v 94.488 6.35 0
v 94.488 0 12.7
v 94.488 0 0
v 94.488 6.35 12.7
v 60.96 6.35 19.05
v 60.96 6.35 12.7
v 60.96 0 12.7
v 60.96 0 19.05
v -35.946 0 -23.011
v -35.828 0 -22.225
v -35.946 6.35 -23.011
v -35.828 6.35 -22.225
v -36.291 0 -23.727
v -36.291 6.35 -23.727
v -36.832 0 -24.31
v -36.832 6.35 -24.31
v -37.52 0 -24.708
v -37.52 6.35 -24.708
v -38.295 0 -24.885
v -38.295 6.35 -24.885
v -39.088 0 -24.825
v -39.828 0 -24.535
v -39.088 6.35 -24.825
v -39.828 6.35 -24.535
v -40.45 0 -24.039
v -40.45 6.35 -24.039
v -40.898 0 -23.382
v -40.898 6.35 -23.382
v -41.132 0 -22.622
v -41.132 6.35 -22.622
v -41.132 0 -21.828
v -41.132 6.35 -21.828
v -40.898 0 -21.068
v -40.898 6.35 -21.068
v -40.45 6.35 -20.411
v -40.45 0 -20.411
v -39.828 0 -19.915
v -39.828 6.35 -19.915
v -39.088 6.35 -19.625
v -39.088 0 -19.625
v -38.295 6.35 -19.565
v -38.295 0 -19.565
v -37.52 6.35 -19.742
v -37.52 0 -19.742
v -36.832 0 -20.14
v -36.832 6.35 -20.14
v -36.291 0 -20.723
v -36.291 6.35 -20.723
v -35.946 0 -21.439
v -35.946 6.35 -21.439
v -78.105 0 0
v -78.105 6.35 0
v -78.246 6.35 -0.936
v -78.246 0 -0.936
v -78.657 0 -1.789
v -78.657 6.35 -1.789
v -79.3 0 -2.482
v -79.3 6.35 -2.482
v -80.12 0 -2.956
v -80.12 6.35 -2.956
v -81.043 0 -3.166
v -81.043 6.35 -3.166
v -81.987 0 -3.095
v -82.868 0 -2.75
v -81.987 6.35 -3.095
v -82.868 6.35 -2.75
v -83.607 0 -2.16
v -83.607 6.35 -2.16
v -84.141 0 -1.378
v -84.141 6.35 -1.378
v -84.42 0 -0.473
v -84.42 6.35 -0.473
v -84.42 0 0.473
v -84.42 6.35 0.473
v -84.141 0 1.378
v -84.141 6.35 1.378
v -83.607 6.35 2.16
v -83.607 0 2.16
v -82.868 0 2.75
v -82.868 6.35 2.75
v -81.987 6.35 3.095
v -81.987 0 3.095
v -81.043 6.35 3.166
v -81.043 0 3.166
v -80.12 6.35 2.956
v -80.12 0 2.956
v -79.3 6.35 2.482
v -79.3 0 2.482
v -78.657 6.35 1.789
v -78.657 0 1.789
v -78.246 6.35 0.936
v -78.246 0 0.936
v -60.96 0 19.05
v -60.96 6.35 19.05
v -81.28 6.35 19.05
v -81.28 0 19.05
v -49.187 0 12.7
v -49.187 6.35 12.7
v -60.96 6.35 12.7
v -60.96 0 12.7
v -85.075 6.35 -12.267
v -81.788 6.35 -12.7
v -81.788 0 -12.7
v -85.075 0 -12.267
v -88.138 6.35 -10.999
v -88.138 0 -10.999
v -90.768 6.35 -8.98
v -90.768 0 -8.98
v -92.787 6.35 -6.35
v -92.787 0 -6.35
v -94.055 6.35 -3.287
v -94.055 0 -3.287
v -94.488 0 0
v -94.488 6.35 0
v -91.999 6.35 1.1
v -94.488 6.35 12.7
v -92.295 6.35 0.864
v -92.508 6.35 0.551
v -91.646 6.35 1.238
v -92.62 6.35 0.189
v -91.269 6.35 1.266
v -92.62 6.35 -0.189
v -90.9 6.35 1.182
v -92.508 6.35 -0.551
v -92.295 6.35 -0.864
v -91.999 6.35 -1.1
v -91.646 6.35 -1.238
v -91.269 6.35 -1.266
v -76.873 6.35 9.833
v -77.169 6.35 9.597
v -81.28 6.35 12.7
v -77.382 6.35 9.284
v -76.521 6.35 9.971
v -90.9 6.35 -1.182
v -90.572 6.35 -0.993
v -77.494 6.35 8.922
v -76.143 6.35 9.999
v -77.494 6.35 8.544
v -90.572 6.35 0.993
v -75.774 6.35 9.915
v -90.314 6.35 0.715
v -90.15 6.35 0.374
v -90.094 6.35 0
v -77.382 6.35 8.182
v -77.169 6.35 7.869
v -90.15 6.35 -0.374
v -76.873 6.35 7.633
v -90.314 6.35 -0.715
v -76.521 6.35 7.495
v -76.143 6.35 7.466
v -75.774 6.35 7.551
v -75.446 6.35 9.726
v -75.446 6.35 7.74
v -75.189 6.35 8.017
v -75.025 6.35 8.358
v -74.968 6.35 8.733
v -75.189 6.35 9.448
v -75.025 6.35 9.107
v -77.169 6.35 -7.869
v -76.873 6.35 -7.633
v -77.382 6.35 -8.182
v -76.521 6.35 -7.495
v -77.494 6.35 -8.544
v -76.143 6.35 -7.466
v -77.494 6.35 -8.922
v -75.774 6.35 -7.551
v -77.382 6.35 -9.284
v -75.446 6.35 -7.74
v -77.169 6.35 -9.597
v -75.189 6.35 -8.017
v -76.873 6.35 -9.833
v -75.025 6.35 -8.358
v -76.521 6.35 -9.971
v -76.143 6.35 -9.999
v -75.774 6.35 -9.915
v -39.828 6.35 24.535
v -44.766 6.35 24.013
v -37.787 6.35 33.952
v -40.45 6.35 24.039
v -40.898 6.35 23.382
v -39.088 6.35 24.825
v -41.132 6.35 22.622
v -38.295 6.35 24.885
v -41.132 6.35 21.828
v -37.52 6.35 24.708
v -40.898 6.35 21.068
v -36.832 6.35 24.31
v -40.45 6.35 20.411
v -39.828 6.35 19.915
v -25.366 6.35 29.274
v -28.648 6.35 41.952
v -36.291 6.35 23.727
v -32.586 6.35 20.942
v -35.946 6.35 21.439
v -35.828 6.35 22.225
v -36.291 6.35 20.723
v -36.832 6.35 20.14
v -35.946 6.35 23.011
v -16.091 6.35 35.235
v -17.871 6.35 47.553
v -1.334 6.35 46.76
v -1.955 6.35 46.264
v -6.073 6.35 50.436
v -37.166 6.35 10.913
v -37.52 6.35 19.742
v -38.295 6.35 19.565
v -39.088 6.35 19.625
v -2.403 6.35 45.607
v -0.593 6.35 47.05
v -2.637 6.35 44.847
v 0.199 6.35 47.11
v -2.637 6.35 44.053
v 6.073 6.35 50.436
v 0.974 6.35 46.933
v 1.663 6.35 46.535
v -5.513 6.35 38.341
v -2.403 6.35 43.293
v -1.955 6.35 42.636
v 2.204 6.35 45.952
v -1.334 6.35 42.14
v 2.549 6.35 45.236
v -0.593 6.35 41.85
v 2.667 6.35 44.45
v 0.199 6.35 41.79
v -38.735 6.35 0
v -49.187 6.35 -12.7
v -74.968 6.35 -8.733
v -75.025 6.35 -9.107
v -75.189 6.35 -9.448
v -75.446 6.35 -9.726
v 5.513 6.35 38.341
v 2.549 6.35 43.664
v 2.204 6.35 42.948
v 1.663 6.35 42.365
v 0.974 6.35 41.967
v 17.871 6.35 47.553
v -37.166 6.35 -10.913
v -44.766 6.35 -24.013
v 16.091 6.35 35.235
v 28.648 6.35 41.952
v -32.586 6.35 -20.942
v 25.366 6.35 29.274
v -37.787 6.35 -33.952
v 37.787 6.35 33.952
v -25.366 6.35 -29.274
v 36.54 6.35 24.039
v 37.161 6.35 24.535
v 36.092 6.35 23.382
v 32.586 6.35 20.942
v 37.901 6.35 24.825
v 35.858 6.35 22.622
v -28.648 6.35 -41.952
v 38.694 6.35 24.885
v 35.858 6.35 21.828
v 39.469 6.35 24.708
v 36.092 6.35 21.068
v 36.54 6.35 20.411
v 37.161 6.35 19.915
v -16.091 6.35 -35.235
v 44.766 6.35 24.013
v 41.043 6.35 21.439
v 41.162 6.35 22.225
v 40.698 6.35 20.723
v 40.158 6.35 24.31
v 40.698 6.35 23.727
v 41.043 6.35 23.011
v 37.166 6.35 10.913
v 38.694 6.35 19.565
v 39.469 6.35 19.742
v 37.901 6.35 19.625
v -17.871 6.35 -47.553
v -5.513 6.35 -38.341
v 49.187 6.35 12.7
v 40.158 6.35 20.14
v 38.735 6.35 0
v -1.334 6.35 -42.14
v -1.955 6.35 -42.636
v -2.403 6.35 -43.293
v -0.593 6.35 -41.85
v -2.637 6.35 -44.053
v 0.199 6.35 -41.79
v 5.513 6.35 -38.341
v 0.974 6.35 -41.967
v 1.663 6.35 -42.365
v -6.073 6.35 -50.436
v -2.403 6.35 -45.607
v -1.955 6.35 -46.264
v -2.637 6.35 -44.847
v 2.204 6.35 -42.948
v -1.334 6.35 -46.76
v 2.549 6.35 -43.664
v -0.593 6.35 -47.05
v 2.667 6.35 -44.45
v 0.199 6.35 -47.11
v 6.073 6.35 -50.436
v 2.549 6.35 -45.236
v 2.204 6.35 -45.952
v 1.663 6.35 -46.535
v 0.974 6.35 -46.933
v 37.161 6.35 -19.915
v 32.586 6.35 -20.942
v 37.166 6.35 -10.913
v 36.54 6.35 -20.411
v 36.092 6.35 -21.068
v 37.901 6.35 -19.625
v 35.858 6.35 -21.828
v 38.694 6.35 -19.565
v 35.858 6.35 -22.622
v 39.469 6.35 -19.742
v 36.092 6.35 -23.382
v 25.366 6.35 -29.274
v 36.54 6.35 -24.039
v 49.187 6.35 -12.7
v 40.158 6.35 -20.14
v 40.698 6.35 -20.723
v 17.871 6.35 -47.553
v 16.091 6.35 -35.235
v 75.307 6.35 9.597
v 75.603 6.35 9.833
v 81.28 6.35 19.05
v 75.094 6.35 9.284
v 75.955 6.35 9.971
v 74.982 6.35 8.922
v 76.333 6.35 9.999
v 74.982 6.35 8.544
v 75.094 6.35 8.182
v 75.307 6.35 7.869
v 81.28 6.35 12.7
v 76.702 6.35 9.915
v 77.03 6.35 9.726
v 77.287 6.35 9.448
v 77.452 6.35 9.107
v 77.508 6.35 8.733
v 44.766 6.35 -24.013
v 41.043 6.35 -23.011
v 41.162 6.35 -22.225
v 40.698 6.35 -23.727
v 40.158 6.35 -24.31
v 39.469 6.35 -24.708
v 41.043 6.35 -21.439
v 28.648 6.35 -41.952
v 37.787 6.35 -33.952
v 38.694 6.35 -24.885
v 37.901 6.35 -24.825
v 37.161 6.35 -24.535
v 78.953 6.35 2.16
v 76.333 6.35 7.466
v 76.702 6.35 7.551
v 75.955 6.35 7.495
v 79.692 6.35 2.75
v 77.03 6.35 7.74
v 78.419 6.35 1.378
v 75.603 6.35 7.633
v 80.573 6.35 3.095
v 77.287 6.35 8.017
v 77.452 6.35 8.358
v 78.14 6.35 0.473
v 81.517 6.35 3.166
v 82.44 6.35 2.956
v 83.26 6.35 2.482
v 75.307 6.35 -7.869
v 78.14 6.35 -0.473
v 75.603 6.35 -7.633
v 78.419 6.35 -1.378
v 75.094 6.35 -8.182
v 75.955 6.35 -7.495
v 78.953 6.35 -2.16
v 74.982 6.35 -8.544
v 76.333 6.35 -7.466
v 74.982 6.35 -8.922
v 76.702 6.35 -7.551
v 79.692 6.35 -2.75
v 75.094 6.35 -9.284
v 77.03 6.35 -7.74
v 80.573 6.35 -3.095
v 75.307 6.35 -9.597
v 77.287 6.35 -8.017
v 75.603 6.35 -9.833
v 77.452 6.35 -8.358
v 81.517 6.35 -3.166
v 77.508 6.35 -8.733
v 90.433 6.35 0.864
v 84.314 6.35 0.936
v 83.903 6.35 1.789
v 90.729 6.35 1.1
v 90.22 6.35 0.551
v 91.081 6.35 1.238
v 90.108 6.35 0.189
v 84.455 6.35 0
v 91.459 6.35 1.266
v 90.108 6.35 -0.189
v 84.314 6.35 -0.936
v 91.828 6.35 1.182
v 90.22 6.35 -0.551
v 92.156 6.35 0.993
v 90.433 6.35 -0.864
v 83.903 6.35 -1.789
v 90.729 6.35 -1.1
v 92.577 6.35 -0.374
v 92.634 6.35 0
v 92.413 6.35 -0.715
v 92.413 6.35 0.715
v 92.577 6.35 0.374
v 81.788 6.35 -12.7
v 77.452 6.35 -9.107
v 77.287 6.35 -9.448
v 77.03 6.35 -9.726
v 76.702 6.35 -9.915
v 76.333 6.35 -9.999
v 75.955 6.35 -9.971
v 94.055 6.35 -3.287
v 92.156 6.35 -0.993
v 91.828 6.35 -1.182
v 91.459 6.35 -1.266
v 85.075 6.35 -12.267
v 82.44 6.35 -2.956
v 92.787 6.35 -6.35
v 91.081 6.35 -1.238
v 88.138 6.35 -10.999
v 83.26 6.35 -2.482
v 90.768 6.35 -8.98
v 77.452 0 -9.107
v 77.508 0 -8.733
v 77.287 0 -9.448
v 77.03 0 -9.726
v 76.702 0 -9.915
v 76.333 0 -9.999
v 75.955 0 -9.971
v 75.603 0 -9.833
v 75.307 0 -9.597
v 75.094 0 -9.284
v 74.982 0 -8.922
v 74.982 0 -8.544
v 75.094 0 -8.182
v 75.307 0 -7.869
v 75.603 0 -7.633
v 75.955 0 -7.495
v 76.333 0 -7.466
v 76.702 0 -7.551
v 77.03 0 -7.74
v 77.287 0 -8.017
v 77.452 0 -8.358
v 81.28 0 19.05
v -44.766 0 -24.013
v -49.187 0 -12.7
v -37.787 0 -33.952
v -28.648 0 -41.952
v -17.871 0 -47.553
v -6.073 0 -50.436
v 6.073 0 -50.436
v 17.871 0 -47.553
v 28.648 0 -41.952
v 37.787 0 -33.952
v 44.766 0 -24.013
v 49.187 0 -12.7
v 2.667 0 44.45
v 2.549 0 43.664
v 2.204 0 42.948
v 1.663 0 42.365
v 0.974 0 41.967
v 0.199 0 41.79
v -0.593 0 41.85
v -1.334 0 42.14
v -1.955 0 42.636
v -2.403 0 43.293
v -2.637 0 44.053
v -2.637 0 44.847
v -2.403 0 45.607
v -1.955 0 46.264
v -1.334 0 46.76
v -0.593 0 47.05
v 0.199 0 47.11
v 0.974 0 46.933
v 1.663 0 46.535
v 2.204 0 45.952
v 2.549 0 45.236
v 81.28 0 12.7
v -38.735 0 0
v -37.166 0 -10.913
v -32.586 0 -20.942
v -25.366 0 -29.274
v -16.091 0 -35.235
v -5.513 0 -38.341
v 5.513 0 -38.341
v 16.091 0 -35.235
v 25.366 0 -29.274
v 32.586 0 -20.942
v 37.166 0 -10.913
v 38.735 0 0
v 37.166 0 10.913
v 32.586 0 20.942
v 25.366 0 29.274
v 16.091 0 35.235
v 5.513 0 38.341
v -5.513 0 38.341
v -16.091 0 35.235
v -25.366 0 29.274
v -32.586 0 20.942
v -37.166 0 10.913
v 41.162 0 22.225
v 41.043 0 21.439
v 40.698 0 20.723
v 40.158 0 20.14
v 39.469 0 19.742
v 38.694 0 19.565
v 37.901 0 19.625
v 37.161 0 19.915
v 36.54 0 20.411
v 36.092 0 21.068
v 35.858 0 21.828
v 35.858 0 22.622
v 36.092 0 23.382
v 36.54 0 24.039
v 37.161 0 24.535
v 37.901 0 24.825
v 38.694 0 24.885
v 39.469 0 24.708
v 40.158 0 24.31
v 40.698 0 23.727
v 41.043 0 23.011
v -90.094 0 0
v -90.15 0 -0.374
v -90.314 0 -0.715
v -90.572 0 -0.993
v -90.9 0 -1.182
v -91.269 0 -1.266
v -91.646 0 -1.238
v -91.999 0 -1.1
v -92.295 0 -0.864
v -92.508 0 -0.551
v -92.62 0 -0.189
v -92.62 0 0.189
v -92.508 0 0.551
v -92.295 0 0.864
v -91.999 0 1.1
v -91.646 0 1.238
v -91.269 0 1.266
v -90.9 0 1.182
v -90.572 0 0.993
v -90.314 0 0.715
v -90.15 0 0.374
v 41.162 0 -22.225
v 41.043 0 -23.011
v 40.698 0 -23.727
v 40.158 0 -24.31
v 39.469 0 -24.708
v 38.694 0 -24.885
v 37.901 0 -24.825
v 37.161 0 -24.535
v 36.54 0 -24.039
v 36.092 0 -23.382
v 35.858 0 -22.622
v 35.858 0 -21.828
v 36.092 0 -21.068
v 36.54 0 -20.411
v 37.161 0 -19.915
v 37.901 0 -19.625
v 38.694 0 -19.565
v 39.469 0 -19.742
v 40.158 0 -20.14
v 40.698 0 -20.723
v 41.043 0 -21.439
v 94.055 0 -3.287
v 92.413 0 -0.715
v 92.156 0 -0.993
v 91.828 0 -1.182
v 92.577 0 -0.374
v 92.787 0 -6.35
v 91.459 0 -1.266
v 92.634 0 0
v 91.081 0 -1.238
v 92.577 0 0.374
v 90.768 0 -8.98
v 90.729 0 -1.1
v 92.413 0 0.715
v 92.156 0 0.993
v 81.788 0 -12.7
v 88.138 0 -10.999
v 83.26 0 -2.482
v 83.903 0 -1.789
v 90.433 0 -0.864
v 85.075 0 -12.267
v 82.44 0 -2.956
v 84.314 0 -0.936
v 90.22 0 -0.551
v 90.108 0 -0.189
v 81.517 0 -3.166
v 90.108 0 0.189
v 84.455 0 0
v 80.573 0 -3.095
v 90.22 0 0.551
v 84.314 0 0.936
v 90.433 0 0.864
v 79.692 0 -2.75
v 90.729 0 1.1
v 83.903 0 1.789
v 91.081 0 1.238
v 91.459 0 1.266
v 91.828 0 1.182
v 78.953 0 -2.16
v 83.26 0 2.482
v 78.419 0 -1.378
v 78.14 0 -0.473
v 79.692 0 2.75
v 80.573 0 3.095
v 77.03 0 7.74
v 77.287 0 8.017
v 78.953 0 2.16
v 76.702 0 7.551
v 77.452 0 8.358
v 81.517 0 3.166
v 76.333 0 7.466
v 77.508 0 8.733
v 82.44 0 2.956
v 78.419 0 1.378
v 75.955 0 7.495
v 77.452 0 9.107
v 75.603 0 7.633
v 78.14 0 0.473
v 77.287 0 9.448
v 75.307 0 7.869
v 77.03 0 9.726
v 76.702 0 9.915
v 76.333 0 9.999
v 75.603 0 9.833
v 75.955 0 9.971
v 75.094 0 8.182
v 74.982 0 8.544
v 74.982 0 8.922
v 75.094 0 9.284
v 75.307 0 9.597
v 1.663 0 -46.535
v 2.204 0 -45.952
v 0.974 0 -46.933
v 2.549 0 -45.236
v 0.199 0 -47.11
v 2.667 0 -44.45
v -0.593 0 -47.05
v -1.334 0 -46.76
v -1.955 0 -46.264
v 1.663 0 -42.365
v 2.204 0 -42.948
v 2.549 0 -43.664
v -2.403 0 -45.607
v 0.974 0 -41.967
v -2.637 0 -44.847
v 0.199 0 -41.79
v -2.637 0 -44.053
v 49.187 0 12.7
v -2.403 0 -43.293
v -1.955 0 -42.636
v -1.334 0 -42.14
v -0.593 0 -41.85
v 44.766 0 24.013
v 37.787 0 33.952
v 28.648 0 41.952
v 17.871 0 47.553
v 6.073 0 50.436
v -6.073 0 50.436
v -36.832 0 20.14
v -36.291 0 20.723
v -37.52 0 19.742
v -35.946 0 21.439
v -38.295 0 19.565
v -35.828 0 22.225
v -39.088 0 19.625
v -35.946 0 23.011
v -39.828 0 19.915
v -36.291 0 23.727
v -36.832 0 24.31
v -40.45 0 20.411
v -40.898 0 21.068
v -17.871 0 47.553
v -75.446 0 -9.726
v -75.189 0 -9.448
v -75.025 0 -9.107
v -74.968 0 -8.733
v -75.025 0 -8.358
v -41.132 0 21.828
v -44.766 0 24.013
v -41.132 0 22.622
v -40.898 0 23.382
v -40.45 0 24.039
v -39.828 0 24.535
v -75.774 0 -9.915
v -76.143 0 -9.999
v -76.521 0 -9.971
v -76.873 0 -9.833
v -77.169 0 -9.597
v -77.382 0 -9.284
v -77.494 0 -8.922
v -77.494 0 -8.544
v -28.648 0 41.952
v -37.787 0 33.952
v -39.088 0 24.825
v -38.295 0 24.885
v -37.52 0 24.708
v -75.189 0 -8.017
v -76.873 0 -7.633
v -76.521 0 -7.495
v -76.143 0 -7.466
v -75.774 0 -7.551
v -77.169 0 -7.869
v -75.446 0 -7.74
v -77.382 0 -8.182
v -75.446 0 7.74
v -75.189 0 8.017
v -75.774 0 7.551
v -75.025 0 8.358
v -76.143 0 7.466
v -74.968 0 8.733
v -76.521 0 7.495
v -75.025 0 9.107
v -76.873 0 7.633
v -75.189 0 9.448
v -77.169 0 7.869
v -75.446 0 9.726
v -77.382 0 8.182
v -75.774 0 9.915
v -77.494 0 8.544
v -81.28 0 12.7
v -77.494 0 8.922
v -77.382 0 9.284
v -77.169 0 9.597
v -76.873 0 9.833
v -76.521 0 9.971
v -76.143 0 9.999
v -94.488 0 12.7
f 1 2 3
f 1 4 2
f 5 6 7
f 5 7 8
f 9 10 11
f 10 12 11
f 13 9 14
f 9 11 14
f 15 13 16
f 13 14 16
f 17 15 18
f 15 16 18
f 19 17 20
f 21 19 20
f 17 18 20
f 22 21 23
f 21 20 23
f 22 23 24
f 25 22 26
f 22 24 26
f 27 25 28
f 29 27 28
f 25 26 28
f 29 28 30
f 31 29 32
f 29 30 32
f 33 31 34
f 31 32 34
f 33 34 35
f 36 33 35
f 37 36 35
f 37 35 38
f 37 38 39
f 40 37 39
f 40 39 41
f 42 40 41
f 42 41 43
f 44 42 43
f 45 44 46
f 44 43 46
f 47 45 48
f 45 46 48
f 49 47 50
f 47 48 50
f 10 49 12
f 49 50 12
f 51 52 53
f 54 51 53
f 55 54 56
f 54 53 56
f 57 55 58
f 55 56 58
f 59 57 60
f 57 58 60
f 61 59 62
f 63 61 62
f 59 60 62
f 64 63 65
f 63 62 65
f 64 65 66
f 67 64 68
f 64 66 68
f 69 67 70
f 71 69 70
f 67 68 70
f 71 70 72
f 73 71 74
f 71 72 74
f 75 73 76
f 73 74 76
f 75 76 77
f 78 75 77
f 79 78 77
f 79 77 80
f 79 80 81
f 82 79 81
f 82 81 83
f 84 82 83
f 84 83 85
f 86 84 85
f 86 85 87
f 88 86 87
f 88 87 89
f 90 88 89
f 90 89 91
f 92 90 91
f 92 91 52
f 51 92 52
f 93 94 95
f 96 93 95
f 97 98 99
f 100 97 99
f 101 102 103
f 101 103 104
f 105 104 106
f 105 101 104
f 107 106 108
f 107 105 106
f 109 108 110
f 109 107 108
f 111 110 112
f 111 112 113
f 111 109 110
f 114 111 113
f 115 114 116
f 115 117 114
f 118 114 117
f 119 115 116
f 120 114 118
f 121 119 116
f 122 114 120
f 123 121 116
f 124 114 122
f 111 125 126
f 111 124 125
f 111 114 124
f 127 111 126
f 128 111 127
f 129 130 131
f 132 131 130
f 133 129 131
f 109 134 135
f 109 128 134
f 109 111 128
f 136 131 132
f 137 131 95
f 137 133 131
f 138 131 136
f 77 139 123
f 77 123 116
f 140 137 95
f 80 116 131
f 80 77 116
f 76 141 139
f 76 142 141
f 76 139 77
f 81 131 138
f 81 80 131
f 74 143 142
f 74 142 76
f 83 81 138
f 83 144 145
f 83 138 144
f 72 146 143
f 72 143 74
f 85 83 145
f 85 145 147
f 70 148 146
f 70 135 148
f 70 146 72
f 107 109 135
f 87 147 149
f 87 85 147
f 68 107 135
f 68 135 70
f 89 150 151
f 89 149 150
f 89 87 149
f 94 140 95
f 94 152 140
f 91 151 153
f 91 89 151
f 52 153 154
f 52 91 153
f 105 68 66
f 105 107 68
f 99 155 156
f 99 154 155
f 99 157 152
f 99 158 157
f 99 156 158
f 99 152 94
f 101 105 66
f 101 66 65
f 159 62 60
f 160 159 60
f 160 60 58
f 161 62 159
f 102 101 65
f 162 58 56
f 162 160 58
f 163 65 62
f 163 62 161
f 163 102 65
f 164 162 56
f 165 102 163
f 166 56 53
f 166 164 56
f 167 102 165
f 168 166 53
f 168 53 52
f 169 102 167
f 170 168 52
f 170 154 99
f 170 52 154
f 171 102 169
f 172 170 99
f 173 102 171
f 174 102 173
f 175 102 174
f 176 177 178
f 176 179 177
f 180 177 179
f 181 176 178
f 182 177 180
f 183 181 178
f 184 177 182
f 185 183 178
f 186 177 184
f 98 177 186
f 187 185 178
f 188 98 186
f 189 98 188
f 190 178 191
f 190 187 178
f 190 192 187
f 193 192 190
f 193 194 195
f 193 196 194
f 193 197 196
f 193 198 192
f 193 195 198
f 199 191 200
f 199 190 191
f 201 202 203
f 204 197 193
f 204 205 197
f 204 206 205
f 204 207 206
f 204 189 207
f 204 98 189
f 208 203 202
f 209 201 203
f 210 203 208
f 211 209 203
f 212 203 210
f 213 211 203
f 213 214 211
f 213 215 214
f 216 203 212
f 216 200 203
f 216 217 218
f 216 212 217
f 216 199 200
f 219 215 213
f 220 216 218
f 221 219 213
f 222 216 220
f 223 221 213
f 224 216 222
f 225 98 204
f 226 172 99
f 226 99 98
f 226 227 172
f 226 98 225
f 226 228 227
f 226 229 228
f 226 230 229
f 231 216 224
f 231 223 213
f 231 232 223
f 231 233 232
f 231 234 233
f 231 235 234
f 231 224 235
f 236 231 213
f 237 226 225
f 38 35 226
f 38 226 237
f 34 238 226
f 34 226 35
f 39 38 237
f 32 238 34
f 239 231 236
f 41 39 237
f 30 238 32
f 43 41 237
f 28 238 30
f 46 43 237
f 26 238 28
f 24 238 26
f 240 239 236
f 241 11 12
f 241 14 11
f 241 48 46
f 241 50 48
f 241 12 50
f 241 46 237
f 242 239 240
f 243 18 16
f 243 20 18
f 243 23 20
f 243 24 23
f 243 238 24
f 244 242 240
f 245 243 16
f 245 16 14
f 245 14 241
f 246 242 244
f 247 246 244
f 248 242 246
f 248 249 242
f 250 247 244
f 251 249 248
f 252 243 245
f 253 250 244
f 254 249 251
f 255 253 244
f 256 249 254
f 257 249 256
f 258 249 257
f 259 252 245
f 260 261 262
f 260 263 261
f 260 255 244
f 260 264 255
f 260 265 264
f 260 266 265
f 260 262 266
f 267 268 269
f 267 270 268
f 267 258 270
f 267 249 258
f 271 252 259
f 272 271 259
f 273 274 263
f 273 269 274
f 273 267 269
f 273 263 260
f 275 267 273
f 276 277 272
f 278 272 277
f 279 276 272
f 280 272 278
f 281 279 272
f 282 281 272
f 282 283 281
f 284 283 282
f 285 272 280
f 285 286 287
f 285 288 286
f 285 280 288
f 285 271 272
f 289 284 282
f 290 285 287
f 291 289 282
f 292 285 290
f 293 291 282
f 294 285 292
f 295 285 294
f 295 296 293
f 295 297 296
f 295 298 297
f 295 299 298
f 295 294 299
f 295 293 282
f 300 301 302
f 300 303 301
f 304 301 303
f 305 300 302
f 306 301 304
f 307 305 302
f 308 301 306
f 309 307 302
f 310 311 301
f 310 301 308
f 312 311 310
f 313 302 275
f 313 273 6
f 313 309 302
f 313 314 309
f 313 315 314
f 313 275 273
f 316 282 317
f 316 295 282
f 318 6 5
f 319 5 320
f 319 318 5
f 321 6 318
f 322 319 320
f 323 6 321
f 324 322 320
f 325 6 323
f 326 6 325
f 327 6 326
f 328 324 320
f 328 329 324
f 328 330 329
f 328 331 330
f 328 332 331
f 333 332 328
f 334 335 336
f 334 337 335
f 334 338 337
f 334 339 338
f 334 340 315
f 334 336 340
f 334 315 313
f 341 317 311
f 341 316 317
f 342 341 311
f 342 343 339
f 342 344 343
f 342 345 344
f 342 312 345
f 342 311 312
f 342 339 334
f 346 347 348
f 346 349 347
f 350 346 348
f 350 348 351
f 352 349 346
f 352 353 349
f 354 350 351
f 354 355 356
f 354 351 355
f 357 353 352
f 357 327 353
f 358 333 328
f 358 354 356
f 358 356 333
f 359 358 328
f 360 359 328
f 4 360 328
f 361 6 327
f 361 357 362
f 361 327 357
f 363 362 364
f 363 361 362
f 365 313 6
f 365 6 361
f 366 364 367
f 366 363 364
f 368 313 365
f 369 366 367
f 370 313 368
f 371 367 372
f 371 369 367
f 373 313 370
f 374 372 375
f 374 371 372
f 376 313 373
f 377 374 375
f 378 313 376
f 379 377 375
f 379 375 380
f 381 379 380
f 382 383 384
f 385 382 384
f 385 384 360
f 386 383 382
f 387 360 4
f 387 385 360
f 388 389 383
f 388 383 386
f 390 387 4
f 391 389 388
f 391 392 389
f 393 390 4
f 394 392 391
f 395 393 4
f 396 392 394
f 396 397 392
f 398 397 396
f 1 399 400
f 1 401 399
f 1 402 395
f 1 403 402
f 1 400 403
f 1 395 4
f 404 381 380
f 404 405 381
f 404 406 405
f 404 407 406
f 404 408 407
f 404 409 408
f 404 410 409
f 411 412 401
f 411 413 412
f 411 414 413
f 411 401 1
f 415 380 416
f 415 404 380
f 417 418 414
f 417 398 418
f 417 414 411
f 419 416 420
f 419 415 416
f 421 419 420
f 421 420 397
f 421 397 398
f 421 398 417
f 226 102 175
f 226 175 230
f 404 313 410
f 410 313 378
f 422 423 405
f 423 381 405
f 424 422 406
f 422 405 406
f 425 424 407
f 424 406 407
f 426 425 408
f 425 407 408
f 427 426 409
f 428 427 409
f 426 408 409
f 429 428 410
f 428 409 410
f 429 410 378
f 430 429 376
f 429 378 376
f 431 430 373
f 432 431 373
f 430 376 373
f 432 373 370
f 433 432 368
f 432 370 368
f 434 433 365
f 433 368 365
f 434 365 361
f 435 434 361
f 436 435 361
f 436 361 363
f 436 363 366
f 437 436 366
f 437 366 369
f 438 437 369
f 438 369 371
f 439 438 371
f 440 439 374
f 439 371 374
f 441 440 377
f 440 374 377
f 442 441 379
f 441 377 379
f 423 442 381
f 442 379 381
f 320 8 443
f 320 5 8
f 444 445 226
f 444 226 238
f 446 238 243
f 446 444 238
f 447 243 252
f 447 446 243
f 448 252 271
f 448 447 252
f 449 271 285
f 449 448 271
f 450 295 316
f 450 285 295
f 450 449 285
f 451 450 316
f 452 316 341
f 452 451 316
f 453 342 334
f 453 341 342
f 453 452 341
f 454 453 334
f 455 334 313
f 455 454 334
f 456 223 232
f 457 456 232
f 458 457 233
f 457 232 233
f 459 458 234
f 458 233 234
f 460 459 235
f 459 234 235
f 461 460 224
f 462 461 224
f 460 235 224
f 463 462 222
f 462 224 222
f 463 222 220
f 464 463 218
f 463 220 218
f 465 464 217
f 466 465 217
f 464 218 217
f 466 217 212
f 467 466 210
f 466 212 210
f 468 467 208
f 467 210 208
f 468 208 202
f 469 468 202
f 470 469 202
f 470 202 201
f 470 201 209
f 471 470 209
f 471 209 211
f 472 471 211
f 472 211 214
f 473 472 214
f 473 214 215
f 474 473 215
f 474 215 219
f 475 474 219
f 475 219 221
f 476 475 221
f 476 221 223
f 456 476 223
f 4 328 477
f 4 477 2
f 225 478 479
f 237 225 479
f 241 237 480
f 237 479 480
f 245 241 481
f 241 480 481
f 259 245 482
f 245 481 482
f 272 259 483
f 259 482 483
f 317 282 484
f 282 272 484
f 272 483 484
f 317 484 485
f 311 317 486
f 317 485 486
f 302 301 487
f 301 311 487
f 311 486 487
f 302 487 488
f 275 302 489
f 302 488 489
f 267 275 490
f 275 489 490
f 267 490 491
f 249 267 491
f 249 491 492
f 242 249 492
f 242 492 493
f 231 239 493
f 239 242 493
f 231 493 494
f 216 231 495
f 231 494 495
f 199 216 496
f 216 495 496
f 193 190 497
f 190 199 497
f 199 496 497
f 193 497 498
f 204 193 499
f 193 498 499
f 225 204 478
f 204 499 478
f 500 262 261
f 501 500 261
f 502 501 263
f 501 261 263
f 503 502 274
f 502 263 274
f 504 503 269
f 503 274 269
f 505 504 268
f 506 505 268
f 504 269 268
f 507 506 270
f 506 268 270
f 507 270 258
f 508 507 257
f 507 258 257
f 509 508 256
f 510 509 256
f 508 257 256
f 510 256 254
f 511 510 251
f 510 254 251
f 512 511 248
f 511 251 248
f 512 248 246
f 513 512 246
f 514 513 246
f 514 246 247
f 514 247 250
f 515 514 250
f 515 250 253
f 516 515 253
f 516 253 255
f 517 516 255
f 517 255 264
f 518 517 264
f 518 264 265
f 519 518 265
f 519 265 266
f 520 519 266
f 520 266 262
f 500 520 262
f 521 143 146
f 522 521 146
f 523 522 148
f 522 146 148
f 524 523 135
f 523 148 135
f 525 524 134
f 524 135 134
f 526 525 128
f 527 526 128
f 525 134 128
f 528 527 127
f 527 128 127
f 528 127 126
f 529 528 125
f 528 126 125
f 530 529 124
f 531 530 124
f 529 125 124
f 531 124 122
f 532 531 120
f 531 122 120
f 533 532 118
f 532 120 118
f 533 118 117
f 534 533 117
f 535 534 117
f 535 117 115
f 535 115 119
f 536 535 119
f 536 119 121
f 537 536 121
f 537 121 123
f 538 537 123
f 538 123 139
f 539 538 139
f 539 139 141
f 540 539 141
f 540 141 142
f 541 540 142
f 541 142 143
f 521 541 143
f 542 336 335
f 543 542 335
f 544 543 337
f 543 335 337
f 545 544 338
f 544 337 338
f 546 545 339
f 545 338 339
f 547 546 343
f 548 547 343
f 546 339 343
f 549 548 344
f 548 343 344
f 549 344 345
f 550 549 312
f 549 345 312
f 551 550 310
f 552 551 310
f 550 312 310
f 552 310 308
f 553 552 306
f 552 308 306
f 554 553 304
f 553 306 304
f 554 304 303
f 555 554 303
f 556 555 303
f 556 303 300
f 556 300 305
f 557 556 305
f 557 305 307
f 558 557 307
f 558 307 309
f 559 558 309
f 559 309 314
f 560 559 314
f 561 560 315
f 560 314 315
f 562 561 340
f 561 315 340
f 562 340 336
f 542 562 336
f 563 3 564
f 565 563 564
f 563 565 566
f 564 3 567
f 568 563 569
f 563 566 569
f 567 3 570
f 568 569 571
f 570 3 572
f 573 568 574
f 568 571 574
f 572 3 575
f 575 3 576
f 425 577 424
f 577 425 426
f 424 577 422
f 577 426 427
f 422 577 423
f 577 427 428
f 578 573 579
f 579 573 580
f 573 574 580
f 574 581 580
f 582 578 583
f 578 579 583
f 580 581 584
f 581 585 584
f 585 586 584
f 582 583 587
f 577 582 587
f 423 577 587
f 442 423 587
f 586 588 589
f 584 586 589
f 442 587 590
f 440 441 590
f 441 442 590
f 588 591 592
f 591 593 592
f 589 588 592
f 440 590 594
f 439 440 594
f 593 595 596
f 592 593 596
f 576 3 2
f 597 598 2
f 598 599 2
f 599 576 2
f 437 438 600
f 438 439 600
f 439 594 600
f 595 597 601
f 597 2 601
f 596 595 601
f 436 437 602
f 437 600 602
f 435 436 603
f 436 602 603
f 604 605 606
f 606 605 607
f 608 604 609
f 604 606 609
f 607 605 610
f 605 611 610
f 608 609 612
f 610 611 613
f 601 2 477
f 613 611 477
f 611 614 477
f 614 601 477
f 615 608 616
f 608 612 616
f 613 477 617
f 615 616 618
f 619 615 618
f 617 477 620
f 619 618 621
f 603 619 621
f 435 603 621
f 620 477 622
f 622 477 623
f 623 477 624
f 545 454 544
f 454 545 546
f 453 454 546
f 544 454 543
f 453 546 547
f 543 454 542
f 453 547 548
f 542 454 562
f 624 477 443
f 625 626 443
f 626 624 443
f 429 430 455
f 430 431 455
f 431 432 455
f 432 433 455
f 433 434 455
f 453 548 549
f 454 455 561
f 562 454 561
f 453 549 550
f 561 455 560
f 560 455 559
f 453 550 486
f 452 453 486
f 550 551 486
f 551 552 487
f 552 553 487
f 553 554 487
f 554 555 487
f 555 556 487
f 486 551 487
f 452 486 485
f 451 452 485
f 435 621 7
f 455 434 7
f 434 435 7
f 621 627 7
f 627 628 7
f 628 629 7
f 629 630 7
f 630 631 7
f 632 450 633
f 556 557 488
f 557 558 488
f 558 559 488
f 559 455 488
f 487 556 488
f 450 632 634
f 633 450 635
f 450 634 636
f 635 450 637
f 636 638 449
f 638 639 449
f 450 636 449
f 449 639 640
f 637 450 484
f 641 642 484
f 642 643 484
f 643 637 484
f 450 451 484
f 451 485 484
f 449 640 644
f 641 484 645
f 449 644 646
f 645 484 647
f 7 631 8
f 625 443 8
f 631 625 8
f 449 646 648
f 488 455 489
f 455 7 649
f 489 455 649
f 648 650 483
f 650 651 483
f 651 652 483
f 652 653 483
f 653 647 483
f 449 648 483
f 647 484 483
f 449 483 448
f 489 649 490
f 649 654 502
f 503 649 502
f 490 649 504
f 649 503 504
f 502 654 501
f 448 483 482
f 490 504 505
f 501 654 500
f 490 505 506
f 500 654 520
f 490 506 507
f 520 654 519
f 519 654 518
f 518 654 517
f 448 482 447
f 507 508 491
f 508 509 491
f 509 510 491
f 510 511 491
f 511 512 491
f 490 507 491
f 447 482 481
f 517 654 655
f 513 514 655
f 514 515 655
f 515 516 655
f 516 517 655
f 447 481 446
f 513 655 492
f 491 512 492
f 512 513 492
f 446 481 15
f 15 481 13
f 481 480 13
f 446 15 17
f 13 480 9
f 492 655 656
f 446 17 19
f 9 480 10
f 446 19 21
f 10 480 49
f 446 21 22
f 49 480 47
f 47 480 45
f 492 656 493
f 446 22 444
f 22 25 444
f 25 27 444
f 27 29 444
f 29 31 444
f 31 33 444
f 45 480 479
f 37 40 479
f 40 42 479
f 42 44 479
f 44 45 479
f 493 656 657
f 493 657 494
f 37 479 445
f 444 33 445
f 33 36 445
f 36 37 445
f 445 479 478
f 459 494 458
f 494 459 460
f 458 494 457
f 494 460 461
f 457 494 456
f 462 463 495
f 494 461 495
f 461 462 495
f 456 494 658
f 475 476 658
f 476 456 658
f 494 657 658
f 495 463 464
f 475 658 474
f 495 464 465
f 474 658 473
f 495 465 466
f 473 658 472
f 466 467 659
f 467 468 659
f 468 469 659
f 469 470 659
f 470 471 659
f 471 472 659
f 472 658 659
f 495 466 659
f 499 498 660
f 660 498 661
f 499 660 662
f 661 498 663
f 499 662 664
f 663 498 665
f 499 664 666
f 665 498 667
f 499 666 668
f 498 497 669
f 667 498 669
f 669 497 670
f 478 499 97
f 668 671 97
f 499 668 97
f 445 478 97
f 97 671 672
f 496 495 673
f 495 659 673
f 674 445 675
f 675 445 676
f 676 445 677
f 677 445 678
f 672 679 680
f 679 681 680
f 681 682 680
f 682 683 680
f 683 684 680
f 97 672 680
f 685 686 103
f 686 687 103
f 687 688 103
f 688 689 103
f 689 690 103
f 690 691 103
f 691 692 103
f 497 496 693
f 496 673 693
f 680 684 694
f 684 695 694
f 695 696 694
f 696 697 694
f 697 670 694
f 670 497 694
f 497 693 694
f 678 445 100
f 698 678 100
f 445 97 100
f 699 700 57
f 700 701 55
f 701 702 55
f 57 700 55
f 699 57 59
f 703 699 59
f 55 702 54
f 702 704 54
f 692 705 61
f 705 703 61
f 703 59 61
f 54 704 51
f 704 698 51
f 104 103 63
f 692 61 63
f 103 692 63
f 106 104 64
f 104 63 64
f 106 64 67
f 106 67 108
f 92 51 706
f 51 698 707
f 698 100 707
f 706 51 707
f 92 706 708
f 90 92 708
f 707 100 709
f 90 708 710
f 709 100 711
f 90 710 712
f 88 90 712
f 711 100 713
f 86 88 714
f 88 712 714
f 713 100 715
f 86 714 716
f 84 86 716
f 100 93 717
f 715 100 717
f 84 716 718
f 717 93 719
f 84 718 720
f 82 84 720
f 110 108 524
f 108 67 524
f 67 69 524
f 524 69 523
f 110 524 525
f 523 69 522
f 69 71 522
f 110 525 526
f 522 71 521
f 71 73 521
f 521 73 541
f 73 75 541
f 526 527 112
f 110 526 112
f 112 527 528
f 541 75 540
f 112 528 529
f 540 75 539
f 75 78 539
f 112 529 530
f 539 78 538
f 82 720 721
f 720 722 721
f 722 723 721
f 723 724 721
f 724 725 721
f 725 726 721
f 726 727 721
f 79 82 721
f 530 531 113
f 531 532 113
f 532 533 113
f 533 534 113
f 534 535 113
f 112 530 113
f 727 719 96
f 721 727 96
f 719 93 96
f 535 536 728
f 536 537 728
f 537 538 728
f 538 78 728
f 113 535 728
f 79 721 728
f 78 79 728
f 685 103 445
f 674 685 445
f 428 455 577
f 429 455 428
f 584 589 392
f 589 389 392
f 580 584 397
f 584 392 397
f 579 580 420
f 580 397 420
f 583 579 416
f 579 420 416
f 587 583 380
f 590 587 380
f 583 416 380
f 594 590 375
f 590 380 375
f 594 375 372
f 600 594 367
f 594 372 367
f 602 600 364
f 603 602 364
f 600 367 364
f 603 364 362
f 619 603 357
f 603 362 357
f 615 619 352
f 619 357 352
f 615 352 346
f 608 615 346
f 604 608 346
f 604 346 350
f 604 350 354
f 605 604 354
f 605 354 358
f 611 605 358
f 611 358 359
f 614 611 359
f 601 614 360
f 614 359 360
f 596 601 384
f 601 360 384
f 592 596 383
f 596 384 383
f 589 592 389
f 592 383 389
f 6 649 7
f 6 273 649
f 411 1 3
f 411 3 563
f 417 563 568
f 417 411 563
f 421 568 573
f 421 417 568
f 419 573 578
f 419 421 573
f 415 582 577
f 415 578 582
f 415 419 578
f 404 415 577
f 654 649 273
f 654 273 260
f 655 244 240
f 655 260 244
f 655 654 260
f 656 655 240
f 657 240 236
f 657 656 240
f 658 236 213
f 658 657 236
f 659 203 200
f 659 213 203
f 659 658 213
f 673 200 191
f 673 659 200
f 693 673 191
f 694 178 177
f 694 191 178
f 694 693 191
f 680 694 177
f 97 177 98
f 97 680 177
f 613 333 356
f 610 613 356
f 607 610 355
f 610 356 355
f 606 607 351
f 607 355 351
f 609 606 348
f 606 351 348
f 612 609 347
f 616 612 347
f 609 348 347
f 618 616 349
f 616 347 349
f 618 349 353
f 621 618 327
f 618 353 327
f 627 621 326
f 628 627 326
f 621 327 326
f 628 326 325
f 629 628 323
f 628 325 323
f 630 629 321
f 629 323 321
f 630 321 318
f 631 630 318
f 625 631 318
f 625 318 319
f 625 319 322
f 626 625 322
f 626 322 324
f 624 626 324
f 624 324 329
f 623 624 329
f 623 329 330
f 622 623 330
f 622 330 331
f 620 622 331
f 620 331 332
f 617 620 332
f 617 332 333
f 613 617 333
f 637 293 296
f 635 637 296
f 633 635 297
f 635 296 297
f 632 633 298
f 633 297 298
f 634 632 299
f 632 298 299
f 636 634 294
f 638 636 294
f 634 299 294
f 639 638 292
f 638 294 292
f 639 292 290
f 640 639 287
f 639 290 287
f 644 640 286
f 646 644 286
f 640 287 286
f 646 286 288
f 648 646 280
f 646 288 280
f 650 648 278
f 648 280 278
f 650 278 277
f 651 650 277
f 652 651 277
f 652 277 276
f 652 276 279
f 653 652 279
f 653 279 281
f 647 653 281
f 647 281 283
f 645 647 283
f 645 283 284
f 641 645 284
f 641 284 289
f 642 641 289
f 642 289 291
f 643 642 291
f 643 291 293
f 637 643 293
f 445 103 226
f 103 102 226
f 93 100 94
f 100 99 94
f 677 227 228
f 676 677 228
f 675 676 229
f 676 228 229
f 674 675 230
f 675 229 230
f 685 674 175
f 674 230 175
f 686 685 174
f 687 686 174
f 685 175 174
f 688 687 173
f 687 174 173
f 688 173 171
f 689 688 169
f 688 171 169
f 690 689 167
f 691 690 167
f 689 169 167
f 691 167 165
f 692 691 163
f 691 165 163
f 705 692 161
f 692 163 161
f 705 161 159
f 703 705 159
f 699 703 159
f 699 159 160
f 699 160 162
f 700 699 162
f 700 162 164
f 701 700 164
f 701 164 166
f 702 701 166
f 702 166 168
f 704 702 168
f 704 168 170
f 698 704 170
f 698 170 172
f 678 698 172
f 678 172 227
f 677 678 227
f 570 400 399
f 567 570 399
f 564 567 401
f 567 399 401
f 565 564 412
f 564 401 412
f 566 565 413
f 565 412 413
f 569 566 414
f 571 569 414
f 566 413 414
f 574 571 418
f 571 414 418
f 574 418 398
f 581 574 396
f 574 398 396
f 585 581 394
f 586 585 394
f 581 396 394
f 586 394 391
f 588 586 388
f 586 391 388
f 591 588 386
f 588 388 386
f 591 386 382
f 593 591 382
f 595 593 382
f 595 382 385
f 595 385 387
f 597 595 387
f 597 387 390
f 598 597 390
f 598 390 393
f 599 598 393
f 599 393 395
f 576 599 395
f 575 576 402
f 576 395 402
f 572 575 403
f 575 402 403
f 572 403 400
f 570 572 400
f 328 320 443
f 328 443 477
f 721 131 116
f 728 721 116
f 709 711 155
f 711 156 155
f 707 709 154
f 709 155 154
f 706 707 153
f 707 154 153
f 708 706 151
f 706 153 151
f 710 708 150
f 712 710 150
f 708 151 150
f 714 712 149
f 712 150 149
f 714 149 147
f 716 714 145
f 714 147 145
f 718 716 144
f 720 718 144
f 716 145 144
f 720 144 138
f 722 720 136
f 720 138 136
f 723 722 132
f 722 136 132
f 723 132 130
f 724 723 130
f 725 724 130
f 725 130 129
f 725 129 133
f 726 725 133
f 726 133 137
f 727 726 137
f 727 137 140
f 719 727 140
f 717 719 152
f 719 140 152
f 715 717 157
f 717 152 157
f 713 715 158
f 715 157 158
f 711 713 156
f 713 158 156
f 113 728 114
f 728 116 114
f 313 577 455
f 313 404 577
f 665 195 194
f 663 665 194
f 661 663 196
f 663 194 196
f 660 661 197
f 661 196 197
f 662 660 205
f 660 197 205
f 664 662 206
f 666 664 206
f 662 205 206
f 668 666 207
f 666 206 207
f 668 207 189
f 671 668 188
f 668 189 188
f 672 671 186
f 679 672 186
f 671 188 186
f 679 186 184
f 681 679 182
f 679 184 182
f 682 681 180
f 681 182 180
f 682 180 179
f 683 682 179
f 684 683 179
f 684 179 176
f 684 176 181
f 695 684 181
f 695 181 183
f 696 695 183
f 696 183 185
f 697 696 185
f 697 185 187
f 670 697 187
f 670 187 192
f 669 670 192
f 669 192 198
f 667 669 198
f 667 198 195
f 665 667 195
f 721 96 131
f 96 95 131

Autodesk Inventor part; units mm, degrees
ref_plane "YZ Plane" through (0, 0, 0) normal (1, 0, 0) x (0, 1, 0)
ref_plane "XZ Plane" through (0, 0, 0) normal (0, 1, 0) x (-1, 0, 0)
ref_plane "XY Plane" through (0, 0, 0) normal (0, 0, 1) x (1, 0, 0)
sketch "Sketch4" plane through (0, 0, 0) normal (0, 1, 0) x (-1, 0, 0)
  circle A0 centre (0, 0) radius 38.735
  circle A1 centre (0, 0) radius 50.8
  dimension "d9" = 77.47
  dimension "d10" = 101.6
extrude "Extrusion2" add sketch "Sketch4" along normal blind 6.35
sketch "Sketch5" plane through (0, 6.35, 0) normal (0, 1, 0) x (1, 0, 0)
  circle A0 centre (0, -44.45) radius 2.667
  circle A1 centre (38.4948, -22.225) radius 2.667
  circle A2 centre (38.4948, 22.225) radius 2.667
  circle A3 centre (0, 44.45) radius 2.667
  circle A4 centre (-38.4948, 22.225) radius 2.667
  circle A5 centre (-38.4948, -22.225) radius 2.667
  point P0 (0, 0)
  dimension "d13" = 5.334
  dimension "d16" = 360
extrude "Extrusion3" cut sketch "Sketch5" against normal blind 6.35
sketch "Sketch7" plane through (0, 6.35, 0) normal (0, 1, 0) x (1, 0, 0)
  line L0 (50.8, 12.7) -> (81.788, 12.7)
  line L1 (81.788, 12.7) -> (81.788, -12.7)
  line L2 (81.788, -12.7) -> (50.8, -12.7)
  line L3 (50.8, -12.7) -> (50.8, 12.7)
  line L4 (-50.8, 12.7) -> (-81.788, 12.7)
  line L5 (-81.788, 12.7) -> (-81.788, -12.7)
  line L6 (-81.788, -12.7) -> (-50.8, -12.7)
  line L7 (-50.8, -12.7) -> (-50.8, 12.7)
  point P0 (0, 0)
  dimension "d50" = 30.988
  dimension "d51" = 25.4
  dimension "d52" = 30.988
extrude "Extrusion4" add sketch "Sketch7" against normal blind 6.35
sketch "Sketch8" plane through (0, 6.35, 0) normal (0, 1, 0) x (1, 0, 0)
  line L0 (-123.5202, 12.7) -> (-50.8, 12.7) projected
  line L1 (-60.9386, 12.7) -> (-45.3133, 12.7)
  line L2 (-45.3133, 12.7) -> (-45.3133, -12.7)
  line L3 (-45.3133, -12.7) -> (-60.9386, -12.7)
  line L4 (-60.9386, -12.7) -> (-60.9386, 12.7)
  line L5 (57.1886, 12.7) -> (43.7508, 12.7)
  line L6 (43.7508, 12.7) -> (43.7508, -12.7)
  line L7 (43.7508, -12.7) -> (57.1886, -12.7)
  line L8 (57.1886, -12.7) -> (57.1886, 12.7)
  point P0 (0, 0)
extrude "Extrusion5" add sketch "Sketch8" against normal blind 6.35
sketch "Sketch9" plane through (0, 6.35, 0) normal (0, 1, 0) x (1, 0, 0)
  line L0 (111.76, 12.7) -> (111.76, -12.7) projected
  line L1 (81.788, 12.7) -> (81.788, -12.7) projected
  circle A0 centre (81.788, 0) radius 12.7
  line L2 (-81.788, 12.7) -> (-81.788, -12.7) projected
  circle A1 centre (-81.788, 0) radius 12.7
  point P0 (0, 0)
  point P1 (-111.7602, 0)
  point P2 (-111.76, -12.7)
extrude "Extrusion6" add sketch "Sketch9" against normal blind 6.35
sketch "Sketch10" plane through (0, 6.35, 0) normal (0, 1, 0) x (1, 0, 0)
  circle A0 centre (81.28, 0) radius 3.175
  circle A1 centre (91.3638, 0) radius 1.27
  circle A2 centre (76.2381, 8.7328) radius 1.27
  circle A3 centre (76.2381, -8.7328) radius 1.27
  circle A4 centre (-81.28, 0) radius 3.175
  circle A5 centre (-91.3638, 0) radius 1.27
  circle A6 centre (-76.2381, -8.7328) radius 1.27
  circle A7 centre (-76.2381, 8.7328) radius 1.27
  point P0 (0, 0)
  dimension "d53" = 6.35
  dimension "d54" = 2.54
  dimension "d57" = 360
  dimension "d59" = 6.35
  dimension "d60" = 2.54
  dimension "d63" = 360
extrude "Extrusion7" cut sketch "Sketch10" against normal blind 6.35
sketch "Sketch11" plane through (0, 6.35, 0) normal (0, 1, 0) x (1, 0, 0)
  arc A0 (-81.788, 12.7) -> (-81.788, -12.7) centre (-81.788, 0) ccw projected
  line L0 (-94.488, 0) -> (-81.788, 0)
  line L1 (-81.788, 0) -> (-81.788, -12.7)
  line L2 (-81.788, -12.7) -> (-94.488, -12.7)
  line L3 (-94.488, -12.7) -> (-94.488, 0)
  arc A1 (81.788, -12.7) -> (81.788, 12.7) centre (81.788, 0) ccw projected
  line L4 (94.488, 0) -> (81.788, 0)
  line L5 (81.788, 0) -> (81.788, -12.7)
  line L6 (81.788, -12.7) -> (94.488, -12.7)
  line L7 (94.488, -12.7) -> (94.488, 0)
  point P0 (0, 0)
extrude "Extrusion8" add sketch "Sketch11" against normal blind 6.35 contours A0 L2 L3 | A1 L7 L6
sketch "Sketch12" plane through (0, 6.35, 0) normal (0, 1, 0) x (1, 0, 0)
  line L0 (-49.1869, -12.7) -> (-94.488, -12.7) projected
  line L1 (-81.28, -12.7) -> (-60.96, -12.7)
  line L2 (-60.96, -12.7) -> (-60.96, -19.05)
  line L3 (-60.96, -19.05) -> (-81.28, -19.05)
  line L4 (-81.28, -19.05) -> (-81.28, -12.7)
  line L5 (94.488, -12.7) -> (49.1869, -12.7) projected
  line L6 (81.28, -12.7) -> (60.96, -12.7)
  line L7 (60.96, -12.7) -> (60.96, -19.05)
  line L8 (60.96, -19.05) -> (81.28, -19.05)
  line L9 (81.28, -19.05) -> (81.28, -12.7)
  point P0 (0, 0)
  dimension "d67" = 20.32
  dimension "d68" = 6.35
  dimension "d69" = 20.32
extrude "Extrusion9" add sketch "Sketch12" against normal blind 6.35
properties part number "middle plate2"
